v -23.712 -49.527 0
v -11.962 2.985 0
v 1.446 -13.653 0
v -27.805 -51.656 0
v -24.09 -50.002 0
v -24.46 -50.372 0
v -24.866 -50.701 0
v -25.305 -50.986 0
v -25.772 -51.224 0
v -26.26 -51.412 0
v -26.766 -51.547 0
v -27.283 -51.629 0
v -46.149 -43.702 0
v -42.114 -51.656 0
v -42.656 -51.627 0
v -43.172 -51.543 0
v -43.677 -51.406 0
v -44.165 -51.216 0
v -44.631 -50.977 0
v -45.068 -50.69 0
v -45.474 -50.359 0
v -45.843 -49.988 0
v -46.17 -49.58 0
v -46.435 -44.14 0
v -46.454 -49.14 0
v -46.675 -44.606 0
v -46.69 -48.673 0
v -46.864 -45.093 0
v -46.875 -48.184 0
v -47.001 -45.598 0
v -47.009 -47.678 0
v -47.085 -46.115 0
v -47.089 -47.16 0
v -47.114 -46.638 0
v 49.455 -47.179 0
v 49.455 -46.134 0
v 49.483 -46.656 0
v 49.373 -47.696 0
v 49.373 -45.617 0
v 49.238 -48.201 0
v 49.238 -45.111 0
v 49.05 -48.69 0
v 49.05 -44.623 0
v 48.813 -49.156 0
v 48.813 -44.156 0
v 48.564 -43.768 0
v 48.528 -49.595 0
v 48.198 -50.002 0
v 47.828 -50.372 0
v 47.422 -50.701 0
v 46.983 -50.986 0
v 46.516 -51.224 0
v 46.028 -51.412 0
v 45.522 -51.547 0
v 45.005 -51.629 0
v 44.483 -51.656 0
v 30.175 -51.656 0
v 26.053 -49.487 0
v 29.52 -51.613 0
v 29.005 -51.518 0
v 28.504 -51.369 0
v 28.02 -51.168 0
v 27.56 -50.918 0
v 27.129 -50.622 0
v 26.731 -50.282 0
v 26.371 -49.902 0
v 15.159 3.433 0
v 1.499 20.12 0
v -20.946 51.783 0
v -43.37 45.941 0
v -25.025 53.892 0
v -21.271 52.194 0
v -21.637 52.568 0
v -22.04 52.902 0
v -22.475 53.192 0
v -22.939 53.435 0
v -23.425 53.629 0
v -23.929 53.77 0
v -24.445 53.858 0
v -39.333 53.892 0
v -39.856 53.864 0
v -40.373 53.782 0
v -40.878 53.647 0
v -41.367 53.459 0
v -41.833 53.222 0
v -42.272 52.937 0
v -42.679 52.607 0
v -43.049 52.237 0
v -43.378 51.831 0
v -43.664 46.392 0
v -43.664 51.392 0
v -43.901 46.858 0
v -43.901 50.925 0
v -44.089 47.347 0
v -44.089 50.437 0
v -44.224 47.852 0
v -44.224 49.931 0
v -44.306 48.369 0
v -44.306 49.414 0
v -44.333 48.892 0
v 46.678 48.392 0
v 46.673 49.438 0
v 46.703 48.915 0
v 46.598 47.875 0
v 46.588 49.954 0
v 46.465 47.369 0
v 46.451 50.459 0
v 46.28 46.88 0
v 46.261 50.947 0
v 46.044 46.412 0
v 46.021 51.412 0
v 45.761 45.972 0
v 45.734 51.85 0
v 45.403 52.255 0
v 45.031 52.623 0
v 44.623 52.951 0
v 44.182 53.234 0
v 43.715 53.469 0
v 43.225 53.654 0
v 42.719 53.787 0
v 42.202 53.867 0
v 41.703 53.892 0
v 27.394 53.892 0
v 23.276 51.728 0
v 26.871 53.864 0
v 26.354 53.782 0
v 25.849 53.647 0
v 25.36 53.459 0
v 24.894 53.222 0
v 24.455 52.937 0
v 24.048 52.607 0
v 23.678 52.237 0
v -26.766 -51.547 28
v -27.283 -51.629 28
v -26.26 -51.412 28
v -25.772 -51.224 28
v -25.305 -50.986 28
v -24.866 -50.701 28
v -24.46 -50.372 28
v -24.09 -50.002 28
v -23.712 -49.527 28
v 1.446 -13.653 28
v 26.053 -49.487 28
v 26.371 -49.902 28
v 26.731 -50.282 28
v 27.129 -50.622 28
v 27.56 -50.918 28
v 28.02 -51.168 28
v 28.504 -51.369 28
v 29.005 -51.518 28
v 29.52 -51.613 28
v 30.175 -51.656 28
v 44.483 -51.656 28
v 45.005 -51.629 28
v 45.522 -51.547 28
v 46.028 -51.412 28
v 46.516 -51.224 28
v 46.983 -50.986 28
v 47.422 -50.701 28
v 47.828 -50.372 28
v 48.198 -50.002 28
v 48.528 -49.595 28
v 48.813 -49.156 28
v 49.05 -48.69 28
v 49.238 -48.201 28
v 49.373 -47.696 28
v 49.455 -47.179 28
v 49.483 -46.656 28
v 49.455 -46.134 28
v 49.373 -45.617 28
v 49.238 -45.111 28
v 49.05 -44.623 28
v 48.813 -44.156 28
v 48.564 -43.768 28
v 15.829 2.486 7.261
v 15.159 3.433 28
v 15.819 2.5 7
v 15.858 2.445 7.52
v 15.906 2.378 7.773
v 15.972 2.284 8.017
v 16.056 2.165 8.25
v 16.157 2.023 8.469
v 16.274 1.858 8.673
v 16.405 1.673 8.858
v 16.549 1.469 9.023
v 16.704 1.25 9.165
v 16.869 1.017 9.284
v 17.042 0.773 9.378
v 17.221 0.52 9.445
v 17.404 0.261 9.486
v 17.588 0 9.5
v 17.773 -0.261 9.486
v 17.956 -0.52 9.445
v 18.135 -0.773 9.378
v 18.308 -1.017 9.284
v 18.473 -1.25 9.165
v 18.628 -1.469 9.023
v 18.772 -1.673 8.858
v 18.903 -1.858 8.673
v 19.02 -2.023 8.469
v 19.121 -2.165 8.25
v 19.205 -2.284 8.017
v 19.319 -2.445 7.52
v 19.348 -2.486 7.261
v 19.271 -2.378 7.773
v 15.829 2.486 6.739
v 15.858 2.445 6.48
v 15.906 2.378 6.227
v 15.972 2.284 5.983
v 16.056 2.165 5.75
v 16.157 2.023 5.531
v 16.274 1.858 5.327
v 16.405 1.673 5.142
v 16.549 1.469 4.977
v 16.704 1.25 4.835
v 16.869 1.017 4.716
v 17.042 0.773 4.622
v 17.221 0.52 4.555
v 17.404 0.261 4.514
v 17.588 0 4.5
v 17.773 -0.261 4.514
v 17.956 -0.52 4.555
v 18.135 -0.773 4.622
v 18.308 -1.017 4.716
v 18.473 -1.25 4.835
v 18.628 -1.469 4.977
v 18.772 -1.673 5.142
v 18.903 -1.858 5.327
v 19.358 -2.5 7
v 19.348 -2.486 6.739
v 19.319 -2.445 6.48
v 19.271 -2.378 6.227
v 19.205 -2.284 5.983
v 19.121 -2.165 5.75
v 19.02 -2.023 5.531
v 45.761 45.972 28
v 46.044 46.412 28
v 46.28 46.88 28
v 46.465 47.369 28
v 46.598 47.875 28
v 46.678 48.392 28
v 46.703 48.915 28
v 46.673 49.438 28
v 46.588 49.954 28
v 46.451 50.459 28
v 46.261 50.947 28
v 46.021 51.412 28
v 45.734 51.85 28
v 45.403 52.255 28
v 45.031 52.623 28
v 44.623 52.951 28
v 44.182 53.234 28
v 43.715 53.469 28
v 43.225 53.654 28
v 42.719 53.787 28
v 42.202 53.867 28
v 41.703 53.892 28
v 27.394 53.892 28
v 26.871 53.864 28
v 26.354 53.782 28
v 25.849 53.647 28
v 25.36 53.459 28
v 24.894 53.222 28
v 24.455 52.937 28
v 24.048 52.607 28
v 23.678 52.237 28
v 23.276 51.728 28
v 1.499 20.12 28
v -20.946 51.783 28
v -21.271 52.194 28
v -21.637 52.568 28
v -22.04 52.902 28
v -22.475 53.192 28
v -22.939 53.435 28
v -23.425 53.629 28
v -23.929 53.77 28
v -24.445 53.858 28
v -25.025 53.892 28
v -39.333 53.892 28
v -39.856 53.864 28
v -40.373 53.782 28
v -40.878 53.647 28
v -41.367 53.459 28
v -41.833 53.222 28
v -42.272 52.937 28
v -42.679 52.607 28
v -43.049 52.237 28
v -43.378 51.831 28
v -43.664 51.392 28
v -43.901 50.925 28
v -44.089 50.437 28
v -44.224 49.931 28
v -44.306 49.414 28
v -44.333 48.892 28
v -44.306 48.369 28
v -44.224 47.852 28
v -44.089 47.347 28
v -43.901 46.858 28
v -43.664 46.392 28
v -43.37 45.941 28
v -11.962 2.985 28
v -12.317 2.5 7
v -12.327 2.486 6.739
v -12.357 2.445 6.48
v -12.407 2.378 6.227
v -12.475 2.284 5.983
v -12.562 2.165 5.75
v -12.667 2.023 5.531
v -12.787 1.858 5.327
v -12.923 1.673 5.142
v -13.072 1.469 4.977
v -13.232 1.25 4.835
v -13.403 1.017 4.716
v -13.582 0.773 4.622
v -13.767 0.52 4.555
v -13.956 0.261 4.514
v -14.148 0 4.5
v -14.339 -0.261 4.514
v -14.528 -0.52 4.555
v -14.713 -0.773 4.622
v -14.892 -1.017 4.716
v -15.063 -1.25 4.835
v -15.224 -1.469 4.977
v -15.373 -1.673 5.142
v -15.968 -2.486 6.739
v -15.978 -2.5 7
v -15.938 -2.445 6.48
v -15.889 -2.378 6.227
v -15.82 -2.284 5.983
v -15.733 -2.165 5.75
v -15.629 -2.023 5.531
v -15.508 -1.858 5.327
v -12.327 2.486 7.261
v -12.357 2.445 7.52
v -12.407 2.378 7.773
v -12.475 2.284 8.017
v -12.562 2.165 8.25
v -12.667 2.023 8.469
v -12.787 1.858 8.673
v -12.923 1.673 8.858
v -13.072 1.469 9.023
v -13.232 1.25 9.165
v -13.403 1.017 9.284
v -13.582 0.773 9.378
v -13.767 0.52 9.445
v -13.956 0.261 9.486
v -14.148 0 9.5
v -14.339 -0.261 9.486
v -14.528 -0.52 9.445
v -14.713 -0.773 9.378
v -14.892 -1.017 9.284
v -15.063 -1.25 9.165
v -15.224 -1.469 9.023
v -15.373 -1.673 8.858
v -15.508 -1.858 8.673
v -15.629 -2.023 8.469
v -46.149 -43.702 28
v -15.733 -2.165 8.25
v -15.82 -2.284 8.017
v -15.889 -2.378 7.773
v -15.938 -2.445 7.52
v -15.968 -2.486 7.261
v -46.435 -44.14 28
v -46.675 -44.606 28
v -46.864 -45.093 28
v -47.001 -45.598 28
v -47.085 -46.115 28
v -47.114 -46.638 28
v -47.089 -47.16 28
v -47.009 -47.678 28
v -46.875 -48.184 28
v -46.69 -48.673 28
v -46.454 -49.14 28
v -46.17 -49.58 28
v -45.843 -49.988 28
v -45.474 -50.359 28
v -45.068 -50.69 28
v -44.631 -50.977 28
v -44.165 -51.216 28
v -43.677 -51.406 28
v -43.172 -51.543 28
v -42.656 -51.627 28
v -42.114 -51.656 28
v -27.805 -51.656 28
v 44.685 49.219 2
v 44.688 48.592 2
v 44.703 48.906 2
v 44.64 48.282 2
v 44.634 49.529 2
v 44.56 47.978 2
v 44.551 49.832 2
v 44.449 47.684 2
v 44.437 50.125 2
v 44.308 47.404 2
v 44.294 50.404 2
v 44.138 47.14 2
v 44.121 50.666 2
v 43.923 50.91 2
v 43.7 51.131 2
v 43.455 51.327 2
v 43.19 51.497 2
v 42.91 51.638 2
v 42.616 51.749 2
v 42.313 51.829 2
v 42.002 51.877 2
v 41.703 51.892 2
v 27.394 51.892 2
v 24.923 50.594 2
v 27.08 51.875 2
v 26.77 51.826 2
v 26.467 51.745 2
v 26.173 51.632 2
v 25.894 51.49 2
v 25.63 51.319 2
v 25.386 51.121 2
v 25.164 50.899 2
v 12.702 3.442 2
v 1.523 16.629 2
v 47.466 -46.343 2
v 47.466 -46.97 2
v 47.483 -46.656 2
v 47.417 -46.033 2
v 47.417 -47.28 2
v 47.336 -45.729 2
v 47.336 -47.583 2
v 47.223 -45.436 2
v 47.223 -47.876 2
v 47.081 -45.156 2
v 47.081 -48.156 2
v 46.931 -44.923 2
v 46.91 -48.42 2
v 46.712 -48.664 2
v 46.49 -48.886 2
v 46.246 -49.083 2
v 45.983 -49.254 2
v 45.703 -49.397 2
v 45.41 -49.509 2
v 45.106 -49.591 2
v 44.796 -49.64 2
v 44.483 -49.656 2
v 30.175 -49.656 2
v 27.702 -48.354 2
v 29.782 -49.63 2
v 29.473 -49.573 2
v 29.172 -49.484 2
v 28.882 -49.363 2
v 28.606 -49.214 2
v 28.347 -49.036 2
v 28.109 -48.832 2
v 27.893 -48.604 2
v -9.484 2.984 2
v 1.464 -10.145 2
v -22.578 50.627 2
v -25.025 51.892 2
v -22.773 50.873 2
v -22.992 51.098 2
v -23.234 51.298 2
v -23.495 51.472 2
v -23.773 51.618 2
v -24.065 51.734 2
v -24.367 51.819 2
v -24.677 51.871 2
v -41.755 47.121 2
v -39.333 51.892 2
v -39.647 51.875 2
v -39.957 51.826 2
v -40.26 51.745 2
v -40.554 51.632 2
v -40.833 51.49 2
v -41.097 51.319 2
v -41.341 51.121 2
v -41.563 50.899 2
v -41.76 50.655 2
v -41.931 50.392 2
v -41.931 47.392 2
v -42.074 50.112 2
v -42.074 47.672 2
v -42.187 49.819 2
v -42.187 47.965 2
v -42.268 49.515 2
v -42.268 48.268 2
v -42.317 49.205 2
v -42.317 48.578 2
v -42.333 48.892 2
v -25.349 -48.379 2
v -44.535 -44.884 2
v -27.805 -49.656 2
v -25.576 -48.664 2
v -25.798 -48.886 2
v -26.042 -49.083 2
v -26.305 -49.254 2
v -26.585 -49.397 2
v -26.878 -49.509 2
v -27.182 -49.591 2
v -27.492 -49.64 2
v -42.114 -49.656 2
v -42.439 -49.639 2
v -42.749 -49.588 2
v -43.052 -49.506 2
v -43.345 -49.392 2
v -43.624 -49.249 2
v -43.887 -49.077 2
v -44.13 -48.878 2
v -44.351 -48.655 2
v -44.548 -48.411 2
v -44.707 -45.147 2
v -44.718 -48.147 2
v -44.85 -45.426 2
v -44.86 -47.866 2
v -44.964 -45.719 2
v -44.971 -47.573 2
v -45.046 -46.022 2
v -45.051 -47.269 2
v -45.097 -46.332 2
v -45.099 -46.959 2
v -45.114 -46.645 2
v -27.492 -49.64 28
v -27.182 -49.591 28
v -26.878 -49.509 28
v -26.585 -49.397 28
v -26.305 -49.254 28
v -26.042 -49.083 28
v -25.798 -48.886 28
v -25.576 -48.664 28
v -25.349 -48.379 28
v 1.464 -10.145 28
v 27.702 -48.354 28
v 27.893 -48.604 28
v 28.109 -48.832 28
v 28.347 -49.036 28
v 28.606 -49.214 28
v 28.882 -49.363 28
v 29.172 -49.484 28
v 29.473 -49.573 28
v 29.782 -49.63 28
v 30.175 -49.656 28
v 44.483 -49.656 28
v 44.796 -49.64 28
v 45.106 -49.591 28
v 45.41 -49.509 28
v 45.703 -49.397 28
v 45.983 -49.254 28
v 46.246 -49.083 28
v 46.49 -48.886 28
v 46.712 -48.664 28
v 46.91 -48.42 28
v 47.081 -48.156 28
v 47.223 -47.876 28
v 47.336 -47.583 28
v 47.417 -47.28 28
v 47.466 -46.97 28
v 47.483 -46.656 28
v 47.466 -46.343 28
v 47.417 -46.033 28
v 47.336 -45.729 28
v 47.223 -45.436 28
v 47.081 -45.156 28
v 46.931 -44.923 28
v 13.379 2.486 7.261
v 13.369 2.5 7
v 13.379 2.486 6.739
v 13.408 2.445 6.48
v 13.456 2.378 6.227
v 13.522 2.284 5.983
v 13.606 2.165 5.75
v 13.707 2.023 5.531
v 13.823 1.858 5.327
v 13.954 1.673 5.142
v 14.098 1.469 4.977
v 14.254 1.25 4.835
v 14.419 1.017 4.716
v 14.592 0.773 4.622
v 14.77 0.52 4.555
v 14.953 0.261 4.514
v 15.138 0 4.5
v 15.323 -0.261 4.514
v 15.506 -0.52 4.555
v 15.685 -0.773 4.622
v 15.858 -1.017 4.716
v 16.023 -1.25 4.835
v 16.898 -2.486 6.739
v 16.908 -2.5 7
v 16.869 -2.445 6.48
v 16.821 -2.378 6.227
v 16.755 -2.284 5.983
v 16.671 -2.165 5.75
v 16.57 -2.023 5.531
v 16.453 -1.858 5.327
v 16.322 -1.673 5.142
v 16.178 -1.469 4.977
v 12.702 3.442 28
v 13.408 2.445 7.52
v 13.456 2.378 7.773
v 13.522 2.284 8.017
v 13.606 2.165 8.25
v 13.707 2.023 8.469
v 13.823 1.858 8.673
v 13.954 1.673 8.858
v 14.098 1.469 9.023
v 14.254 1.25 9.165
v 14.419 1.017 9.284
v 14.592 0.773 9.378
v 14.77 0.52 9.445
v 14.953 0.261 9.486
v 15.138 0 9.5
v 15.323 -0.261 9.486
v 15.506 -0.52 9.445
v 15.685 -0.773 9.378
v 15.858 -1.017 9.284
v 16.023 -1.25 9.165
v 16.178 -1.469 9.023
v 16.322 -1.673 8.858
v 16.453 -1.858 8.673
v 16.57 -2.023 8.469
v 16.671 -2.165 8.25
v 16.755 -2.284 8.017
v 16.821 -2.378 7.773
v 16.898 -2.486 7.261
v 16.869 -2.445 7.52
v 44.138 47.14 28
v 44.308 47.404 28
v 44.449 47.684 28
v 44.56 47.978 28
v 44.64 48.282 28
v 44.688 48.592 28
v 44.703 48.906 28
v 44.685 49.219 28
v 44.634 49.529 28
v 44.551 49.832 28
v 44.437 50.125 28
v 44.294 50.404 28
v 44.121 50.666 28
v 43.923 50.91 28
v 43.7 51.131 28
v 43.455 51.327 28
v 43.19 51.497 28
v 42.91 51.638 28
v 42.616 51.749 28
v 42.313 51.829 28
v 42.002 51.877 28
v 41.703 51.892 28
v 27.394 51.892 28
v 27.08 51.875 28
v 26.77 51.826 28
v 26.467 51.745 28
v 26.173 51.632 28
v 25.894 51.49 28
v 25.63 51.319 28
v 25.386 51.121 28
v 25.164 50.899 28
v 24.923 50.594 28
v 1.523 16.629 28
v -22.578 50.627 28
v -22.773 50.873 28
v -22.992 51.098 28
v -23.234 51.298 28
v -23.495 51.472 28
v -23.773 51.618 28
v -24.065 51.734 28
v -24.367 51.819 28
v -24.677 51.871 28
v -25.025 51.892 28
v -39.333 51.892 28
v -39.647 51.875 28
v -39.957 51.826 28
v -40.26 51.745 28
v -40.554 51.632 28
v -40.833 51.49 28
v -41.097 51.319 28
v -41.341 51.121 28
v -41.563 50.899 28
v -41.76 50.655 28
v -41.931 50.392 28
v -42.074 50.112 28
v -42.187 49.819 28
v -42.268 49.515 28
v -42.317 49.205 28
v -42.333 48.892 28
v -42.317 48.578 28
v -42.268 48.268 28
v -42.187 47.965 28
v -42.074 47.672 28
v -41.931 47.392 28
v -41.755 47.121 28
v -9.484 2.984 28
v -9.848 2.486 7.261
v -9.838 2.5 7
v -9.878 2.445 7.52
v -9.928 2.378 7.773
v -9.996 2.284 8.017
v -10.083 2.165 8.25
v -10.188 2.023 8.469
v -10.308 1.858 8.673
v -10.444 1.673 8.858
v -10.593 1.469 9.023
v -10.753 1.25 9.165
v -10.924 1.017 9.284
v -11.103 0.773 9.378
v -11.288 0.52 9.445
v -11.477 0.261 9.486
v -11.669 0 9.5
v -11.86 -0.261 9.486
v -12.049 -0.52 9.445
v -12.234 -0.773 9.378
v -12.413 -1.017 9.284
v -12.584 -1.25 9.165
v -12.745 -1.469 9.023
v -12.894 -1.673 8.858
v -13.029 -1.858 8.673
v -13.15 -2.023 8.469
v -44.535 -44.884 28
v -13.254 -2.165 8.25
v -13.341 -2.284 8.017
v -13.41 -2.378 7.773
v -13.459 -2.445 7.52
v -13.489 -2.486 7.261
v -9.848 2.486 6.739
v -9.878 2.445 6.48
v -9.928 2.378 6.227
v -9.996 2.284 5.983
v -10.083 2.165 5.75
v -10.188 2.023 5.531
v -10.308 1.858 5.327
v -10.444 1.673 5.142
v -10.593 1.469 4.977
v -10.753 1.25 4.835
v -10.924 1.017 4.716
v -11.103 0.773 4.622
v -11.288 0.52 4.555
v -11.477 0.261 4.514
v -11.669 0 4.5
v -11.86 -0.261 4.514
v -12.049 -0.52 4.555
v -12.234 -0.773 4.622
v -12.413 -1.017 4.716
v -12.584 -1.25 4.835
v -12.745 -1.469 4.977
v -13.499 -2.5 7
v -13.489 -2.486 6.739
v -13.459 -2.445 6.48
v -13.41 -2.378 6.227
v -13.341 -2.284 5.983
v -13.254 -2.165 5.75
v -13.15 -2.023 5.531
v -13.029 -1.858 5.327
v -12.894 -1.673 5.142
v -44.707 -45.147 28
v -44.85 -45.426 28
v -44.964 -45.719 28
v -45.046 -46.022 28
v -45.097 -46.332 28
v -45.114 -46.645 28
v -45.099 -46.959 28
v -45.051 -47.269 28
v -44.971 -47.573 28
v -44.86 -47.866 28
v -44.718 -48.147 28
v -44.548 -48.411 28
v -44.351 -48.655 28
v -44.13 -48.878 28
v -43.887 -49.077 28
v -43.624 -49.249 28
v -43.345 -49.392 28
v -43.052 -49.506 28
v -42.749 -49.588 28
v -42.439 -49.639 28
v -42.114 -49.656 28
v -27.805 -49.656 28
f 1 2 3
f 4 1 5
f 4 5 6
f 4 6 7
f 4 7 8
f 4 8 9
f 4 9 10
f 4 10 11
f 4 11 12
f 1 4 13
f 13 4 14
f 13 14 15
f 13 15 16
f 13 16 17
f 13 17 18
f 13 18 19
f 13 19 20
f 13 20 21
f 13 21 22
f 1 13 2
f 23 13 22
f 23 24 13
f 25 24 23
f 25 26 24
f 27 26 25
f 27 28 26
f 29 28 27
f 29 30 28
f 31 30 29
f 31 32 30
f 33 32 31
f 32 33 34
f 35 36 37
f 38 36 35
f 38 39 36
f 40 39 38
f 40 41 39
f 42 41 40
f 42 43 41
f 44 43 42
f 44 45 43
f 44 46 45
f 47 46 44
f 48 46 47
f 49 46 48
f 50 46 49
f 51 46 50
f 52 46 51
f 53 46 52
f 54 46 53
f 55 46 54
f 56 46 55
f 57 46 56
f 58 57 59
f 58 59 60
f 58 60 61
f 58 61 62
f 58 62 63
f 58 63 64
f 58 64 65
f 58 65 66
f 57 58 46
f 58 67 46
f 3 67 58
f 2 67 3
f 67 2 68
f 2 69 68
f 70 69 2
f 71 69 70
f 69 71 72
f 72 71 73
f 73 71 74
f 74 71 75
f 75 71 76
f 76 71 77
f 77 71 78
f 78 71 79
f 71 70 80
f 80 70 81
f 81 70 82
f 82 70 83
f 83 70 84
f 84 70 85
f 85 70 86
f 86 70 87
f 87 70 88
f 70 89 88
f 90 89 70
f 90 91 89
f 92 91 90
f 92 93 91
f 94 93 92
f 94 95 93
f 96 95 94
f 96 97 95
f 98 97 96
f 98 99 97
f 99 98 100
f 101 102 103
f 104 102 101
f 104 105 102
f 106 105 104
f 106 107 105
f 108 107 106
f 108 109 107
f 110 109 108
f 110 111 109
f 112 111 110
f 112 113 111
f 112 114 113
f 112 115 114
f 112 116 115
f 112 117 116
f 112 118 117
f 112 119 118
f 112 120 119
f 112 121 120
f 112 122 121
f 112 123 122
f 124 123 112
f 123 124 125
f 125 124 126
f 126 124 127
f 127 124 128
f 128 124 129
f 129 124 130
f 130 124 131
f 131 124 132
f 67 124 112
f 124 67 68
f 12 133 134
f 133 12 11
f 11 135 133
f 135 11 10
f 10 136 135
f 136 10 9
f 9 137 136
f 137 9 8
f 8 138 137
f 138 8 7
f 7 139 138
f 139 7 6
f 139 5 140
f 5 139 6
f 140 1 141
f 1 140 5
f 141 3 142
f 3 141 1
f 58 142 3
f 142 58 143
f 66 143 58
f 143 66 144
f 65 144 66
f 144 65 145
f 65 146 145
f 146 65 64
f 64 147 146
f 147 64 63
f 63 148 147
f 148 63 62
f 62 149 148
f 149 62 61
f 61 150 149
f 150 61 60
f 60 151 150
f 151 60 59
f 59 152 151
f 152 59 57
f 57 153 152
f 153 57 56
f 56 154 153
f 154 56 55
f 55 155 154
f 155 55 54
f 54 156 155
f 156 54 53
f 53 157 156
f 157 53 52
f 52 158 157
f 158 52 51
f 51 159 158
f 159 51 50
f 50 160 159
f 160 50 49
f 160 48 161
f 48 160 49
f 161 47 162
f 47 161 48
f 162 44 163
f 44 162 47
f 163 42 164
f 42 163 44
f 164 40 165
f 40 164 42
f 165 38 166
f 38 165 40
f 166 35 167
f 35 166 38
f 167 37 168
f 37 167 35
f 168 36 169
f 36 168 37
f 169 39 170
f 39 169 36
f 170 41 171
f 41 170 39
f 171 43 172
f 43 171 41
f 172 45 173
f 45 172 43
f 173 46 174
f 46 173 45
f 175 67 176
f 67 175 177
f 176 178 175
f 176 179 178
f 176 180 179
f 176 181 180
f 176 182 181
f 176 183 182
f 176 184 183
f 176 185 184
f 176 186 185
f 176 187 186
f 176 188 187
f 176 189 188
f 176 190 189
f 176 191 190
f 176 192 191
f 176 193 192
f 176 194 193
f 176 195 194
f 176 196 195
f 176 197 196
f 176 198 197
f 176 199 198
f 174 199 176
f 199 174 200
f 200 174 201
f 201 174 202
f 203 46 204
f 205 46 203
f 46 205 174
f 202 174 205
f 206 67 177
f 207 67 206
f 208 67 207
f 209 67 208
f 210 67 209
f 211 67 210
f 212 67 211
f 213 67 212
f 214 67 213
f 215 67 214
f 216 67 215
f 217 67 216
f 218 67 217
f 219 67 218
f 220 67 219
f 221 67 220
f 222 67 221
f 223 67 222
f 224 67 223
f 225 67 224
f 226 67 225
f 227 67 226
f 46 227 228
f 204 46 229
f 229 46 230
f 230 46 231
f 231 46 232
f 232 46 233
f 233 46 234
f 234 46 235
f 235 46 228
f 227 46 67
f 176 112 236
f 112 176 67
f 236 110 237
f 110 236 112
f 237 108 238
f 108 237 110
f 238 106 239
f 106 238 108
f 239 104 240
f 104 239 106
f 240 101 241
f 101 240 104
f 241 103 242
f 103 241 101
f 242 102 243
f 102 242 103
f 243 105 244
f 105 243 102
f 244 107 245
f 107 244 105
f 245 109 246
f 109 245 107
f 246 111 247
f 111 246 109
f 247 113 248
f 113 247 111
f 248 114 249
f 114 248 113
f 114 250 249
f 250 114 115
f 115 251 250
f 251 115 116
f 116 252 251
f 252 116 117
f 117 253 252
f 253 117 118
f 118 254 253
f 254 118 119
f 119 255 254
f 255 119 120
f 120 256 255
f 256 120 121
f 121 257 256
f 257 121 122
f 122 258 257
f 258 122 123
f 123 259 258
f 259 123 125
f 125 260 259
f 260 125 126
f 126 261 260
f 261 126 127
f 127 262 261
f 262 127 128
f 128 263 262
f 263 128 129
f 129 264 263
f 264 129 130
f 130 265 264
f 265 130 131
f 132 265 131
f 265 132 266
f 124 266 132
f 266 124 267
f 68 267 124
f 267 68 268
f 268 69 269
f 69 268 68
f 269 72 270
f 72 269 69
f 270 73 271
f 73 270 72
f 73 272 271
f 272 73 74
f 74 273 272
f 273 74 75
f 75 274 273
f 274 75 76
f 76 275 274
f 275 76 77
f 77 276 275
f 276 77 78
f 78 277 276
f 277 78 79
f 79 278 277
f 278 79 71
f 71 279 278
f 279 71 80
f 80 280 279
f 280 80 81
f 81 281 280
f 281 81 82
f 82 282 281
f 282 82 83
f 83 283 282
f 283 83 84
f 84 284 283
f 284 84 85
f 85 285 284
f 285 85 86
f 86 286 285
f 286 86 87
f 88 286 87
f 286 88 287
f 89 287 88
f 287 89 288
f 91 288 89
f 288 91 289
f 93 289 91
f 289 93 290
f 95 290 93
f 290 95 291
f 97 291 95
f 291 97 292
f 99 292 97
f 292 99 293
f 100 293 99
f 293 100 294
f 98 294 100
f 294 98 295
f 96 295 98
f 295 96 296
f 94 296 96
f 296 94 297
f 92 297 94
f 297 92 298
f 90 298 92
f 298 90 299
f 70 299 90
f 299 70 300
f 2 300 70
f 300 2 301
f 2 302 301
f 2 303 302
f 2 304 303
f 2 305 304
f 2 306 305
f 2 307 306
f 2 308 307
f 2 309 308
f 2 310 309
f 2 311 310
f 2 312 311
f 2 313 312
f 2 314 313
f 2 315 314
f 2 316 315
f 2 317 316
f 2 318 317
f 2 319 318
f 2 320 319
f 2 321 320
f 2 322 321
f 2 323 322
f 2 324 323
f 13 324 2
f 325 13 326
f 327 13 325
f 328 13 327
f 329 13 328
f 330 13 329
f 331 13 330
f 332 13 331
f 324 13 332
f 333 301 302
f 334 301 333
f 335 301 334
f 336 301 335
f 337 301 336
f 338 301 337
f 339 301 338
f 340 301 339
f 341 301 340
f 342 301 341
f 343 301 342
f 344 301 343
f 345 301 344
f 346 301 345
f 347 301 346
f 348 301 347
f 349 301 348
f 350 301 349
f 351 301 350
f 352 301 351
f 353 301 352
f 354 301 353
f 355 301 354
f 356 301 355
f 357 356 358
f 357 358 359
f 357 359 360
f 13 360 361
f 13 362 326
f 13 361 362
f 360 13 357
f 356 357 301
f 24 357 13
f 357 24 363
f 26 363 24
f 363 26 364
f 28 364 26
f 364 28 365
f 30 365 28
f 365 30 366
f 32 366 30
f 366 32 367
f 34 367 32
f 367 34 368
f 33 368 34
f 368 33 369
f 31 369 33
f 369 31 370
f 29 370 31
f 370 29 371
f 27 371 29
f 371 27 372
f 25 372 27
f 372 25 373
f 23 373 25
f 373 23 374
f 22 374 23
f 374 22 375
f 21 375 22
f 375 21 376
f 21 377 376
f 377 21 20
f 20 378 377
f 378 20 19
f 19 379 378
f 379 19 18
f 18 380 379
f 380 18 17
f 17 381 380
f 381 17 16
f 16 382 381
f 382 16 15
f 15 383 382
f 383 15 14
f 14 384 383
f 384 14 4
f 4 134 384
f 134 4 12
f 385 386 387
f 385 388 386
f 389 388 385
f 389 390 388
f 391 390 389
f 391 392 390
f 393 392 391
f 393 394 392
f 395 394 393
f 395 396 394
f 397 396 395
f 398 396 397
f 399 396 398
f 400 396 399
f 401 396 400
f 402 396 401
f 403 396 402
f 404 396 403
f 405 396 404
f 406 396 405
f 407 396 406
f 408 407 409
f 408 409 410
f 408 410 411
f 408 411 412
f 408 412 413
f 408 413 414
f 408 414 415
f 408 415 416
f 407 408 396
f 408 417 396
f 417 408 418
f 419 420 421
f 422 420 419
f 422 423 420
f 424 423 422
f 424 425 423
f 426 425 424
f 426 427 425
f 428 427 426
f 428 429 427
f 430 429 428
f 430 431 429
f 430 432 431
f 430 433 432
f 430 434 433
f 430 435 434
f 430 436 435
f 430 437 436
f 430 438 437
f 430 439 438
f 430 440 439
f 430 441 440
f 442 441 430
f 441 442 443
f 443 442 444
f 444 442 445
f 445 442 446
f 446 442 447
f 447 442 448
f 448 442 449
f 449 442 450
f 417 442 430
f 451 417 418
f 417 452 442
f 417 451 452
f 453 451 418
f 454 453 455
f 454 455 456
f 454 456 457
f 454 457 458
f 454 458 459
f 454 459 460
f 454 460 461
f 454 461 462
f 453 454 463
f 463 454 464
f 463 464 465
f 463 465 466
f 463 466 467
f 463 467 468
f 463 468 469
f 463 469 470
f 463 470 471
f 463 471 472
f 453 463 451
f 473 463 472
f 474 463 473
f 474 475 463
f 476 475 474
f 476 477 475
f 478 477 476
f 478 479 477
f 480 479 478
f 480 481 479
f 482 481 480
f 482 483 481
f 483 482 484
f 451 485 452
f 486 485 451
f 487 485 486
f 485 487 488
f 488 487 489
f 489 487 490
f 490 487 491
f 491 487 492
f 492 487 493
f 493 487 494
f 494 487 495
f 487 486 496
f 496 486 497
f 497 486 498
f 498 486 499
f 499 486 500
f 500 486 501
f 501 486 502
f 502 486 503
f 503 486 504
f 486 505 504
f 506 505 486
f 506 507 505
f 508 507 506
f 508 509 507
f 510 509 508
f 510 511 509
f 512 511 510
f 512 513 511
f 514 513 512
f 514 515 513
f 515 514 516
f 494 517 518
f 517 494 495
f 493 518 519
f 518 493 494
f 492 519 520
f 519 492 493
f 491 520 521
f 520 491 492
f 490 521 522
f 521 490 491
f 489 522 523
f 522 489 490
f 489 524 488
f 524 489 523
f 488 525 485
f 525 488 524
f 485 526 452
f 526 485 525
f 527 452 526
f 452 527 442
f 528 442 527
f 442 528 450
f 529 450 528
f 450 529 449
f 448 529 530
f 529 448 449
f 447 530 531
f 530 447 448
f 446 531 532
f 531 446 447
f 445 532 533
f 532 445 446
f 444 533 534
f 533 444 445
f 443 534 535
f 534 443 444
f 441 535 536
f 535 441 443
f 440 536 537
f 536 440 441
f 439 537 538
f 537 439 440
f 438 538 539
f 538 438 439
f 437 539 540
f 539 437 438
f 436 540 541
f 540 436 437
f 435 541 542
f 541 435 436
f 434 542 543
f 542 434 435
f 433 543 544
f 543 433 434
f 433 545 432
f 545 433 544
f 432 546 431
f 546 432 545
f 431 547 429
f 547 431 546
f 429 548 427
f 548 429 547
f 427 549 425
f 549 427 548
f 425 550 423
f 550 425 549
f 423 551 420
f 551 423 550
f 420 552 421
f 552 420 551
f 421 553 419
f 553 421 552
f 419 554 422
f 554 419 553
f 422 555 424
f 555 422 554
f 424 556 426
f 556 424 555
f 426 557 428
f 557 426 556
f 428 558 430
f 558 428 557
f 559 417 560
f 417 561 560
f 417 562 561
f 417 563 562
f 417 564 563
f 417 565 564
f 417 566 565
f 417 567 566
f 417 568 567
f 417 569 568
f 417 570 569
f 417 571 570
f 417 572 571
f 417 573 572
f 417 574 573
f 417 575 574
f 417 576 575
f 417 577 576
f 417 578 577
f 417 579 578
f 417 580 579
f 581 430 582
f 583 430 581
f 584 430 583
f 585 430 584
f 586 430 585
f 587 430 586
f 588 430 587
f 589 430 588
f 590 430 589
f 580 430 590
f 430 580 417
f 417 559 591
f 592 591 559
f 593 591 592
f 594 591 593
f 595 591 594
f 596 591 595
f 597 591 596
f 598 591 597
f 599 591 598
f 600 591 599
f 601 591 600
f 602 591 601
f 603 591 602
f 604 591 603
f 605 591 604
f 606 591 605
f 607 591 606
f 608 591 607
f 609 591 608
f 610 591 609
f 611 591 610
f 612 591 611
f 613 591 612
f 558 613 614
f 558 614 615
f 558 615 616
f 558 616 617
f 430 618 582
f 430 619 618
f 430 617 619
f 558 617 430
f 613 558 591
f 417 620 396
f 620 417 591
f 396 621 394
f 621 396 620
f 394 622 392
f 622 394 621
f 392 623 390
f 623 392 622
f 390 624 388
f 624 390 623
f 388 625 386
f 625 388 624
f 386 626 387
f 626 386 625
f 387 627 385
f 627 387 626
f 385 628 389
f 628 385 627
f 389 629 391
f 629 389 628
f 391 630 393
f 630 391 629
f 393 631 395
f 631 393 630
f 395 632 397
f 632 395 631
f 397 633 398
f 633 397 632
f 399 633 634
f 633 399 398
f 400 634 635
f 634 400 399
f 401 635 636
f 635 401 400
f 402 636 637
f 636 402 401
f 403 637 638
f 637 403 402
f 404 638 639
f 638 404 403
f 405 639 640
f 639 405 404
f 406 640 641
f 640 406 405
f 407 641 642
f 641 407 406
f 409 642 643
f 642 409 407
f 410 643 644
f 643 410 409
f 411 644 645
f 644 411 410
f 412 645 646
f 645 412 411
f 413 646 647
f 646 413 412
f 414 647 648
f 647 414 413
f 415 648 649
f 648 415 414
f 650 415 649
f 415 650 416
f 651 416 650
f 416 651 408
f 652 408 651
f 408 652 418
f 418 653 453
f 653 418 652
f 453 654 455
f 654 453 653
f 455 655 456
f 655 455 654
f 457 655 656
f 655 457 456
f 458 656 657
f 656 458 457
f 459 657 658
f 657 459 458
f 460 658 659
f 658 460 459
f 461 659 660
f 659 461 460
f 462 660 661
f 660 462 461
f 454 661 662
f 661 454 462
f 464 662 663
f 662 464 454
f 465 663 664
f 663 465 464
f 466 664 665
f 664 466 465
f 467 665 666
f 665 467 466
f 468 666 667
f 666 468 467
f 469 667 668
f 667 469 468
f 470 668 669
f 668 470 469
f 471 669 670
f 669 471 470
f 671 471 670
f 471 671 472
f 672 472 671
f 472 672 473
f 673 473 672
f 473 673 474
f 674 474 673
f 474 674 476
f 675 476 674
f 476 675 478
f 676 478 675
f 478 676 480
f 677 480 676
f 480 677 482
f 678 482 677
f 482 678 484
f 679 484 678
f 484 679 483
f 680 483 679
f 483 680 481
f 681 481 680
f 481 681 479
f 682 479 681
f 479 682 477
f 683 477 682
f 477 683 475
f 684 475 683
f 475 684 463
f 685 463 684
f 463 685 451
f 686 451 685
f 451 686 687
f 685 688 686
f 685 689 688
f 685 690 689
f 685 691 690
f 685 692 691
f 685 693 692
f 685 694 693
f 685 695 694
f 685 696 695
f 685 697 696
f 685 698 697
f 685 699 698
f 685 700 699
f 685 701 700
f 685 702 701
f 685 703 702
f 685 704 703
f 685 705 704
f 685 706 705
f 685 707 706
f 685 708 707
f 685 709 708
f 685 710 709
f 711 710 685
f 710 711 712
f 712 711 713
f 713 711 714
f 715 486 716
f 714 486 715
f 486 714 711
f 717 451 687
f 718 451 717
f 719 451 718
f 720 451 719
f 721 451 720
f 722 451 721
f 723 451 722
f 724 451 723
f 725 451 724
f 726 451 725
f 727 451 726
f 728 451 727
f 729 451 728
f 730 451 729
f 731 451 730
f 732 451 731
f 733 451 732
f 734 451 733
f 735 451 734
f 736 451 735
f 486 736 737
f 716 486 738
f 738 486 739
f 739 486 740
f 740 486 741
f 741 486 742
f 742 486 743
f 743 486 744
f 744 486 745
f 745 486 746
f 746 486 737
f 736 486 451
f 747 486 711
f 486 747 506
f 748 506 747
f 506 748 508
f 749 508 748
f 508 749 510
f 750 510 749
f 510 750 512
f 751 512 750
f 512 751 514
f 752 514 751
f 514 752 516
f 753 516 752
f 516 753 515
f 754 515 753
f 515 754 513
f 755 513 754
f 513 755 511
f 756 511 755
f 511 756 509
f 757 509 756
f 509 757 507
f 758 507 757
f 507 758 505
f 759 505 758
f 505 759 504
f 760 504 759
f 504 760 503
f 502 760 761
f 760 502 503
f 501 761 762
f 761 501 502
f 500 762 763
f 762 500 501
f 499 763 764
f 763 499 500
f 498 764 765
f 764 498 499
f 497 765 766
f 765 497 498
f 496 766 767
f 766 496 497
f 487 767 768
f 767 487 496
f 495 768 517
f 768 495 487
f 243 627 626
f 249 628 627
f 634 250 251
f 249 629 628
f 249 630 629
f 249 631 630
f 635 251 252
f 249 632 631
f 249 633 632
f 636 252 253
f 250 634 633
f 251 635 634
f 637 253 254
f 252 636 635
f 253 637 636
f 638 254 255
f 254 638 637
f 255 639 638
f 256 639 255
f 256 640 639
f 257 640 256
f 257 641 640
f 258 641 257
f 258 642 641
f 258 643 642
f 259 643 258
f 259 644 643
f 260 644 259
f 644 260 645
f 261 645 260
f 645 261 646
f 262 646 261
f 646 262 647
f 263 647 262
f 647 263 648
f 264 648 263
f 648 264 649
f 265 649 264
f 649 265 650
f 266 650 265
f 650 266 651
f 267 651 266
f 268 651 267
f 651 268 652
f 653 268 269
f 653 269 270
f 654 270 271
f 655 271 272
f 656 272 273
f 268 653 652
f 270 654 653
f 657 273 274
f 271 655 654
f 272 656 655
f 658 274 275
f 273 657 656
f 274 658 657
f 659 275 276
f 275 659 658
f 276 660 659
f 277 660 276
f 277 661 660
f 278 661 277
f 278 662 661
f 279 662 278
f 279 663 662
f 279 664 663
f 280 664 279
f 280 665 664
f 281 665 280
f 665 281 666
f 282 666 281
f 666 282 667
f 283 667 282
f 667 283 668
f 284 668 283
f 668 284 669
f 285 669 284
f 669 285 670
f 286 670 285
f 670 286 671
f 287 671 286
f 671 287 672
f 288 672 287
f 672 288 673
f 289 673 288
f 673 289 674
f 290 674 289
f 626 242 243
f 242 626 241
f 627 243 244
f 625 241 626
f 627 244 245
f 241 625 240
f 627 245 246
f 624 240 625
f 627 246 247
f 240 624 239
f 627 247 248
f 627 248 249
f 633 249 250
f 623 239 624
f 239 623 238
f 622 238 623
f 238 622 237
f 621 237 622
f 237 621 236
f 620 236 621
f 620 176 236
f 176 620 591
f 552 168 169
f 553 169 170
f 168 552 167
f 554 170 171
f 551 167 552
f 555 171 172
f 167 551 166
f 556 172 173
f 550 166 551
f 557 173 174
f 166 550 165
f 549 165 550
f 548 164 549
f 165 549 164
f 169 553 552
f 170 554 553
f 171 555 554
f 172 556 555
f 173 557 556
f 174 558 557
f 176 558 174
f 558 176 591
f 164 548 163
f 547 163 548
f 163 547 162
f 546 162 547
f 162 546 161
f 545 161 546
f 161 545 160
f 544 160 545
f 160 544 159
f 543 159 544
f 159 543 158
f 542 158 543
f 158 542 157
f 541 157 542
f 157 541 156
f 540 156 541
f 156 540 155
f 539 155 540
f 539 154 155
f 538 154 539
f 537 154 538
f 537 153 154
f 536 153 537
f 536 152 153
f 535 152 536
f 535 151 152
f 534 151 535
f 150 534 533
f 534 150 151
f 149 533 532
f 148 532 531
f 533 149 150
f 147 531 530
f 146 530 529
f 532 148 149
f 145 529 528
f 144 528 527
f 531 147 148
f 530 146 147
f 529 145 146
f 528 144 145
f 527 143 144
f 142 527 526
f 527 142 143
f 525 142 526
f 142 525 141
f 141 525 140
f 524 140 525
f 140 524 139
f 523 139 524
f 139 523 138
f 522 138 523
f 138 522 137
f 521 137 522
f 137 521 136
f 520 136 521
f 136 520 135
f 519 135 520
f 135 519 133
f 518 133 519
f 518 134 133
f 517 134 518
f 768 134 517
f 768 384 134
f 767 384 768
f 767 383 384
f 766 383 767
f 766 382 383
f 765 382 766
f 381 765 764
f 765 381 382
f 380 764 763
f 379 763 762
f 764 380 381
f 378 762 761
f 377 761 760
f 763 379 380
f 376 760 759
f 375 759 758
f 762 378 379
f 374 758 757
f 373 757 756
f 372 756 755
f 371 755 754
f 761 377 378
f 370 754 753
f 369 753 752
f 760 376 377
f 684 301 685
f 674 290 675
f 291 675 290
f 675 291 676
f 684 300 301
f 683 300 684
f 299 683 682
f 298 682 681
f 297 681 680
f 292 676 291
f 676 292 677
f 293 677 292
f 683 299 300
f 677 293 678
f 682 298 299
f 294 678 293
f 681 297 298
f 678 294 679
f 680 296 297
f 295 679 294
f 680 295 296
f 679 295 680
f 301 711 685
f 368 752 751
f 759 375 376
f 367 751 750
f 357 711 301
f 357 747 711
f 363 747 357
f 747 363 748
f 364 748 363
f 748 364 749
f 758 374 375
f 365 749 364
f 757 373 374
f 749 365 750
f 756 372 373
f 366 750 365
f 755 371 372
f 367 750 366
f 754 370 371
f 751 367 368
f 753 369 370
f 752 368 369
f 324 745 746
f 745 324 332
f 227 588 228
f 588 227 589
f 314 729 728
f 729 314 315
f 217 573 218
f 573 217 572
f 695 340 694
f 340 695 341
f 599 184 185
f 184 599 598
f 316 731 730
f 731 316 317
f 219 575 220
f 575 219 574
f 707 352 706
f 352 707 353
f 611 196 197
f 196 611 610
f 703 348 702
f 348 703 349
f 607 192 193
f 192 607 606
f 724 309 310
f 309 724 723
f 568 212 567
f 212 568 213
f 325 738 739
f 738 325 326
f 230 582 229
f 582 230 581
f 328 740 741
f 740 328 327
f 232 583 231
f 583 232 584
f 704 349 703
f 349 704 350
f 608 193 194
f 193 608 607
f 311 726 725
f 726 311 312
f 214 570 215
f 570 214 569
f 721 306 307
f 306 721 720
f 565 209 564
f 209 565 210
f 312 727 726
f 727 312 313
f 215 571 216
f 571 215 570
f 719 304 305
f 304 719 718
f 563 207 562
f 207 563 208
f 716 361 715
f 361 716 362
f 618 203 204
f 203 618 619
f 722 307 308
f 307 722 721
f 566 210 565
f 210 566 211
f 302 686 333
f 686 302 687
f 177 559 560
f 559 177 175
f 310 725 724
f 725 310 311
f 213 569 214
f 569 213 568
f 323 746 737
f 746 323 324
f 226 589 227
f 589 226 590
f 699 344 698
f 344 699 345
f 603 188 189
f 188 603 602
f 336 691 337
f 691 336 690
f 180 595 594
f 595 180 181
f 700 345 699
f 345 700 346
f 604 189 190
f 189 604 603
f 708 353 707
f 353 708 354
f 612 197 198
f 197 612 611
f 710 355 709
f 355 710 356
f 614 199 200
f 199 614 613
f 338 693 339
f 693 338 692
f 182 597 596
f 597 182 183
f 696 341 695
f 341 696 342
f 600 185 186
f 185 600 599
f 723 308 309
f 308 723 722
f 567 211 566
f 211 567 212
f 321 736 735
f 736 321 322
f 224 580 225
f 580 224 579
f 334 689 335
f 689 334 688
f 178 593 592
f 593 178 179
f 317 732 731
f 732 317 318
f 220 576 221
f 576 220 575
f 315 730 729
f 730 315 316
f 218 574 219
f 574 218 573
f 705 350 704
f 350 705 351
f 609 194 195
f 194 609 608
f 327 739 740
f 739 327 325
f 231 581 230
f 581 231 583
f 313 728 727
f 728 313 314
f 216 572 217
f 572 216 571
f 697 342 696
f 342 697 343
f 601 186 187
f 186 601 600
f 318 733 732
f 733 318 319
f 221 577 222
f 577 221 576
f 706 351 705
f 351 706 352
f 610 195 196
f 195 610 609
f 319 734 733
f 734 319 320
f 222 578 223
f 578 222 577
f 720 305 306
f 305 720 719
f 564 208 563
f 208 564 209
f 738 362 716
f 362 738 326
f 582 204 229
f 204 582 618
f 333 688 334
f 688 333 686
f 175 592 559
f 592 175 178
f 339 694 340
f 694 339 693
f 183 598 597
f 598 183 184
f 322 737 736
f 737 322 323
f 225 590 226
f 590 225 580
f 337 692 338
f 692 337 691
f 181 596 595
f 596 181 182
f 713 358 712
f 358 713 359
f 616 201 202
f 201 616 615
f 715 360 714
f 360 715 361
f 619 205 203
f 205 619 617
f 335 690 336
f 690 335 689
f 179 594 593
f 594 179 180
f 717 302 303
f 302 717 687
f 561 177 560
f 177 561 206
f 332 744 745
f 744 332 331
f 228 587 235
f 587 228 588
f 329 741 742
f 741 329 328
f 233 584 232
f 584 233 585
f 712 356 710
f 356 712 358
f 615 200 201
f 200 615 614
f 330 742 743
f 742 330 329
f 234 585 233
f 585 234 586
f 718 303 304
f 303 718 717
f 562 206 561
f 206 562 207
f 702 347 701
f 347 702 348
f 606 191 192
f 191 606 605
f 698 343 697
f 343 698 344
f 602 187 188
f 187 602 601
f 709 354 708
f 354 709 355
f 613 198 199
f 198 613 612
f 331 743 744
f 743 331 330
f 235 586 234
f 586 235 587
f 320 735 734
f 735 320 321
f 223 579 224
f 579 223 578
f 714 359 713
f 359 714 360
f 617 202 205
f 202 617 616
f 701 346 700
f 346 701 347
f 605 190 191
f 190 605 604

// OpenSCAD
// AUTOMATICALLY GENERATED FILE: Letter_X
// SIGN SCULPTOR ENGINE V2

Render_Mode = "Body"; // Set to "Lid" to export the cover
Letter = "X";
Font_Size = 100;
Font_Name = "Arial:style=Black";
Light_Type = "Silicone_Neon_6mm";

// -- Engineering Constants --
Sign_Height = 30.0;
Wall_Thickness = 2.0;
Base_Thickness = 2.0;
Lid_Tolerance = 0.15;
Hole_Height = 5.0;
Hole_Size = 5.0;

// -- Logic Engine --
CW = (Light_Type == "Silicone_Neon_6mm") ? 6.0 :
     (Light_Type == "Silicone_Neon_8mm") ? 8.0 :
     (Light_Type == "LED_Strip_10mm")    ? 10.5 :
     (Light_Type == "Individual_Pixels")  ? 14.0 : 6.0;

Lip_Overhang = (Light_Type == "Silicone_Neon_6mm" || Light_Type == "Silicone_Neon_8mm") ? 0.4 : 0.0;

$fn = 60;

module letter_shape() {
    text(text=Letter, size=Font_Size, font=Font_Name, halign="center", valign="center");
}

module body_geometry() {
    difference() {
        // 1. Positive Block
        linear_extrude(Sign_Height)
            offset(r = CW/2 + Wall_Thickness)
            letter_shape();

        // 2. Light Channel
        translate([0,0, Base_Thickness])
            linear_extrude(Sign_Height + 1)
            offset(r = CW/2)
            letter_shape();

        // 3. Friction Lip
        if (Lip_Overhang > 0) {
            translate([0,0, Sign_Height - 2.0])
                linear_extrude(3.0)
                difference() {
                    offset(r = CW/2 + 5) letter_shape();
                    offset(r = CW/2 - Lip_Overhang) letter_shape();
                }
        }
        
        // 4. Lid Shelf
        translate([0,0, Sign_Height - 2.0])
            linear_extrude(3.0)
            offset(r = CW/2 + 1.5)
            letter_shape();

        // 5. WIRE CHANNELS (Dynamic Side Holes)
        // Left Hole
        translate([-Font_Size/1.8, 0, Hole_Height + Base_Thickness])
            rotate([0, 90, 0])
            cylinder(h = Font_Size, r = Hole_Size/2);
            
        // Right Hole
        translate([Font_Size/1.8, 0, Hole_Height + Base_Thickness])
            rotate([0, -90, 0])
            cylinder(h = Font_Size, r = Hole_Size/2);
    }
}

module lid_geometry() {
    color("White")
        linear_extrude(2.0)
        offset(r = (CW/2 + 1.5) - Lid_Tolerance)
        letter_shape();
}

// Render Controller
if (Render_Mode == "Body") {
    body_geometry();
} else if (Render_Mode == "Lid") {
    lid_geometry();
}
